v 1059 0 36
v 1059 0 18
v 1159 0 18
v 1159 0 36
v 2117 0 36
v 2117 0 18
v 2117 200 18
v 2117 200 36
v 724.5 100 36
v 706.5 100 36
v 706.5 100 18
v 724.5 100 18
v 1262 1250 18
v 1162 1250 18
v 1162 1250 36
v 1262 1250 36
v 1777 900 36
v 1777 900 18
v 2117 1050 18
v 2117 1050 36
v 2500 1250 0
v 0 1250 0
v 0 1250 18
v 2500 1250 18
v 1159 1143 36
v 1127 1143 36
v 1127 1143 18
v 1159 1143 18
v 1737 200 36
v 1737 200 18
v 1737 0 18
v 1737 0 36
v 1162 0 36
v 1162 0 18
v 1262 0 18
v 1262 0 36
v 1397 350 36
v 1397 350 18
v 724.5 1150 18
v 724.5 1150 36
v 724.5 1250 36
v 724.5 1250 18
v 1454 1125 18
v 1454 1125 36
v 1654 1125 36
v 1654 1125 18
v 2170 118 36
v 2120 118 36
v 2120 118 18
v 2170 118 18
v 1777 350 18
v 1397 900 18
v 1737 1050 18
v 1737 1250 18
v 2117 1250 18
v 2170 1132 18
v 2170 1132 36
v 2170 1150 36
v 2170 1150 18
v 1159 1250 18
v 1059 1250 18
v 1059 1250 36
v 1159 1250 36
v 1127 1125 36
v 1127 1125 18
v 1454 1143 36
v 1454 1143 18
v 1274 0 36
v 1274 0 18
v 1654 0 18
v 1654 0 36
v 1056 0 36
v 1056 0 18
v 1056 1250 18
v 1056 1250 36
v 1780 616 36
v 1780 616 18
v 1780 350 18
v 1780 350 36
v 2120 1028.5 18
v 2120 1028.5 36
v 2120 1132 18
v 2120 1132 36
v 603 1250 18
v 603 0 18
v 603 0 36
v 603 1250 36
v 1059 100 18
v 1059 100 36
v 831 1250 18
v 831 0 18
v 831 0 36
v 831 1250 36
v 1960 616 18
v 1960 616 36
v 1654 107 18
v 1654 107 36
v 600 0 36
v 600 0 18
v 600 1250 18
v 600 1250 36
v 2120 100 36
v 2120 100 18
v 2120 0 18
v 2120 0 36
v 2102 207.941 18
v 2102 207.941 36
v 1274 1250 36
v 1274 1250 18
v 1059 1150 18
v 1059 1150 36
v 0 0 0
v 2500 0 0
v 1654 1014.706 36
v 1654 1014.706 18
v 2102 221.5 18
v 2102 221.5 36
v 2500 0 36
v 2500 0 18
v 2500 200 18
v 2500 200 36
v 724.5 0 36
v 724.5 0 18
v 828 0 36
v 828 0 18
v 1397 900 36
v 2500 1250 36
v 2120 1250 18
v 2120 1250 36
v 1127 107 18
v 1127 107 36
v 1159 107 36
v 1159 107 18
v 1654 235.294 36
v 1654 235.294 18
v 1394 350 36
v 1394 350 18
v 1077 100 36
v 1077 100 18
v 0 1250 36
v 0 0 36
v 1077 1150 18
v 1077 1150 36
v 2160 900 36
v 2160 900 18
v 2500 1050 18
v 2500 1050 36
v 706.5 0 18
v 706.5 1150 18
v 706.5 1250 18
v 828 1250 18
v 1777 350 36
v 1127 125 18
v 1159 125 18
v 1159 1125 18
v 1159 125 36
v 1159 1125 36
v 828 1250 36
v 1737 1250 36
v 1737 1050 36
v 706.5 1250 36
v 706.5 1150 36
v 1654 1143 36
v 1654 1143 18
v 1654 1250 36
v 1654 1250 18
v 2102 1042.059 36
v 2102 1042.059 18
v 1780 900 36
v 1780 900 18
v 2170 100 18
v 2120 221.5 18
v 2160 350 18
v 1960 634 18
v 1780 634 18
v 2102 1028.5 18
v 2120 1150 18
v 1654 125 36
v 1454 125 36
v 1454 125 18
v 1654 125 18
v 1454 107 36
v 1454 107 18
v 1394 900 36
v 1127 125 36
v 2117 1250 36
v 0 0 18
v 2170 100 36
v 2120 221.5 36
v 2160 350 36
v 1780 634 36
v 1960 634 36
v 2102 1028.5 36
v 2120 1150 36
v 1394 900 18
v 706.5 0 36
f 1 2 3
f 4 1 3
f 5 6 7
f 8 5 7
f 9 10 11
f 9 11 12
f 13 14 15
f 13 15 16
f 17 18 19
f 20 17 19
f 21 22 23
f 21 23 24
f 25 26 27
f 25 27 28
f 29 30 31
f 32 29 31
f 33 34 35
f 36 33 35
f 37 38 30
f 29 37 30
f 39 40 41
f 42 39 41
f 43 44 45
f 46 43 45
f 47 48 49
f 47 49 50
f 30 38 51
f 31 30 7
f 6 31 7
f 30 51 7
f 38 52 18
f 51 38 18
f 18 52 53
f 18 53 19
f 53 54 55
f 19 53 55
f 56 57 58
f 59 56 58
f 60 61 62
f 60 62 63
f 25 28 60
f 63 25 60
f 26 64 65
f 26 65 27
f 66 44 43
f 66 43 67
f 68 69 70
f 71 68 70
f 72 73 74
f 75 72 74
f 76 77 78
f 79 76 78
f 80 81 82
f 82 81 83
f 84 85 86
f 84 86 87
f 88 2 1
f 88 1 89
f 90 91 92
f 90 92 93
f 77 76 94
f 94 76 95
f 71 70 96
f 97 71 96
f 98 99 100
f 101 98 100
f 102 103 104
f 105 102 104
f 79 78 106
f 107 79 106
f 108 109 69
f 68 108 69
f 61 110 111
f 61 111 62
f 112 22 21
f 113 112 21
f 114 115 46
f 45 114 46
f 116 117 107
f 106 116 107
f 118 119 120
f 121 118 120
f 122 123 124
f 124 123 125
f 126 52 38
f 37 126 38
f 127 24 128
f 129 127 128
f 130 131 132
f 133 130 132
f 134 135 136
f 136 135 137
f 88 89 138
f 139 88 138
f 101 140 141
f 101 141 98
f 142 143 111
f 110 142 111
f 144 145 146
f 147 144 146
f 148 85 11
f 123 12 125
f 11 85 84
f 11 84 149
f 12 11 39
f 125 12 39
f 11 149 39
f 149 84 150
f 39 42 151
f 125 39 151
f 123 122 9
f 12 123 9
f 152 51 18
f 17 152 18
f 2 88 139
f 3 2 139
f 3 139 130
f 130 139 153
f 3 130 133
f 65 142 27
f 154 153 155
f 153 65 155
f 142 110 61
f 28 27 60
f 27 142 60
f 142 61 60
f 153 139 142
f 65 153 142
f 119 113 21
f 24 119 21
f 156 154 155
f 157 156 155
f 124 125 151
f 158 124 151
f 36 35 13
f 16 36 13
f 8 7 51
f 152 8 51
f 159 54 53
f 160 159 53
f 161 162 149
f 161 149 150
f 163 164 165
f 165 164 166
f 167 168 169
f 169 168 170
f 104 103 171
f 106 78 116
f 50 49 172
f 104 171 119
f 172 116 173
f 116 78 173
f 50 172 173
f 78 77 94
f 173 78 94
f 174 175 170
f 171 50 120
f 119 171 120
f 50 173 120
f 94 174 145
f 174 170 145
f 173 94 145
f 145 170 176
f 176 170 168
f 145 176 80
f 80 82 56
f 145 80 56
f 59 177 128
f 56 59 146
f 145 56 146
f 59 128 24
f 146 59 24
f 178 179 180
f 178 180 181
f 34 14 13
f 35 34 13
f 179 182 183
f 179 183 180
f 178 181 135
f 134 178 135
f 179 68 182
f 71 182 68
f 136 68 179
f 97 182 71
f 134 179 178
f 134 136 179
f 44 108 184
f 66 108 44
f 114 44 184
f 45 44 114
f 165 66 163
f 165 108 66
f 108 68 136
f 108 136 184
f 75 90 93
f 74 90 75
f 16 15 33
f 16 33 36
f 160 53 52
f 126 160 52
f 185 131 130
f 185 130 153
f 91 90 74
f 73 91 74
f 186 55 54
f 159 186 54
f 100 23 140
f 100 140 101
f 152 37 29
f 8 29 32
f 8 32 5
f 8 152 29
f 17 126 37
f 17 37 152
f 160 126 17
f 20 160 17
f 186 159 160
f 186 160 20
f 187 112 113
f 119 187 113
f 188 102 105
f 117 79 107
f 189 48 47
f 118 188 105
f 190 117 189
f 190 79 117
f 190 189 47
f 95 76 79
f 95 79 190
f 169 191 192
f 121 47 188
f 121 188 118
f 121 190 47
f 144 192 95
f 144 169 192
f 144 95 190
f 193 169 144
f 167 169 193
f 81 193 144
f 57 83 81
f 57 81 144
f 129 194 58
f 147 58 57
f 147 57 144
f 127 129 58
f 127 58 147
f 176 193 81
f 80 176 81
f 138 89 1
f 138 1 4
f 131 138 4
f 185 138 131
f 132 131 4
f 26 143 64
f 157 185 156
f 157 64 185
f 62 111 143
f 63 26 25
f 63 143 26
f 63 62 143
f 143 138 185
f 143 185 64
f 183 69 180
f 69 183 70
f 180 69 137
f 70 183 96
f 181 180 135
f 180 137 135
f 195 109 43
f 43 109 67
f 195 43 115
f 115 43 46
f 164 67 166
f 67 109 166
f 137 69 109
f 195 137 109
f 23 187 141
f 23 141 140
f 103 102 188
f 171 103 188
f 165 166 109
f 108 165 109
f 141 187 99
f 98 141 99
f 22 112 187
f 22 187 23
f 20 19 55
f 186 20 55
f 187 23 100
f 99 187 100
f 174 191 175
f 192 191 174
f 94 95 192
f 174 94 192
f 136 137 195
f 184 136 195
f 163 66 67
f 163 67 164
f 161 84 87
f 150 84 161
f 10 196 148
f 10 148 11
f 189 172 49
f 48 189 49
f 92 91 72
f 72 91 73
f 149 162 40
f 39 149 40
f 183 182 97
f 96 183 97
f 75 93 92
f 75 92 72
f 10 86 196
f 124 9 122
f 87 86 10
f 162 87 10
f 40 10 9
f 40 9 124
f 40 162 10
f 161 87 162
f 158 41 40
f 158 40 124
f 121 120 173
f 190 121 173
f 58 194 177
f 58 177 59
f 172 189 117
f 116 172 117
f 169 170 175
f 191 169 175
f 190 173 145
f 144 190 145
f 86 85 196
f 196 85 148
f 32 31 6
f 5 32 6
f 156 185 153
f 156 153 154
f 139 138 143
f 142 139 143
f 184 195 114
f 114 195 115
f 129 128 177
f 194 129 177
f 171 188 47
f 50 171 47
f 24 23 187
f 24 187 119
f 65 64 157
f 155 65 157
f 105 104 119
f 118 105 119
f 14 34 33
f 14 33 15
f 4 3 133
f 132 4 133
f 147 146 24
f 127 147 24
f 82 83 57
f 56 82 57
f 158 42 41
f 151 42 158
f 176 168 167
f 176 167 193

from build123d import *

# Parameters (mm, degrees)
F0_W      = 2500
F0_H      = 1250
F1_DEPTH  = 18
F3_DEPTH  = 18
F6_DEPTH  = 18
F7_W      = 600
F7_H      = 1250
F8_DEPTH  = 18
F9_W      = 225
F9_H      = 1250
F10_DEPTH = 18
F12_W     = 100
F12_H     = 1250
F13_DEPTH = 18
F16_DEPTH = 18
F17_W     = 32
F17_H     = 18
F18_DEPTH = 36.001
F19_W     = 18
F19_H     = 100
F20_DEPTH = 18
F21_W     = 50
F21_H     = 18
F22_DEPTH = 18
F23_W     = 180
F23_H     = 18
F24_DEPTH = 18
F25_W     = 200
F25_H     = 18
F26_DEPTH = 18


with BuildPart() as f1:
    # F0 (on Top) → F1 (new body)
    with BuildSketch(Plane.XY):
        with Locations((1250, 625)):
            Rectangle(F0_W, F0_H)
    extrude(amount=F1_DEPTH)


with BuildPart() as f3:
    # F2 (on face) → F3 (new body)
    with BuildSketch(Plane.XY.offset(18)):
        Polygon((2500, 1050), (2500, 1250), (2120, 1250), (2120, 1050), (1780, 900), (1780, 350), (2120, 200), (2120, 0), (2500, 0), (2500, 200), (2160, 350), (2160, 900), align=None)
    extrude(amount=F3_DEPTH)


with BuildPart() as f4_1:
    # F4: copy of F3
    add(f3.part.moved(Location((-383, 0, 0))))


with BuildPart() as f6:
    # F5 (on face) → F6 (new body)
    with BuildSketch(Plane.XY.offset(18)):
        Polygon((1654, 1014.7058823529), (1654, 1250), (1274, 1250), (1274, 0), (1654, 0), (1654, 235.2941176471), (1394, 350), (1394, 900), align=None)
    extrude(amount=F6_DEPTH)

    # F25 (on face) → F26 (cut, through all)
    with BuildSketch(Plane.XY.offset(36)):
        with Locations((1554, 1134)):
            Rectangle(F25_W, F25_H)
        with Locations((1554, 116)):
            Rectangle(F25_W, F25_H)
    extrude(amount=-F26_DEPTH, mode=Mode.SUBTRACT)


with BuildPart() as f8:
    # F7 (on face) → F8 (new body)
    with BuildSketch(Plane.XY.offset(18)):
        with Locations((300, 625)):
            Rectangle(F7_W, F7_H)
    extrude(amount=F8_DEPTH)


with BuildPart() as f10:
    # F9 (on face) → F10 (new body)
    with BuildSketch(Plane.XY.offset(18)):
        with Locations((715.5, 625)):
            Rectangle(F9_W, F9_H)
    extrude(amount=F10_DEPTH)


with BuildPart() as f11_1:
    # F11: copy of F10
    add(f10.part.moved(Location((228, 0, 0))))


with BuildPart() as f13:
    # F12 (on face) → F13 (new body)
    with BuildSketch(Plane.XY.offset(18)):
        with Locations((1109, 625)):
            Rectangle(F12_W, F12_H)
    extrude(amount=F13_DEPTH)


with BuildPart() as f14_1:
    # F14: copy of F13
    add(f13.part.moved(Location((103, 0, 0))))


with BuildPart() as f13_1:
    add(f13.part)

    # F15 (on face) → F16 (cut)
    with BuildSketch(Plane.XY.offset(36)):
        Polygon((1077, 1150), (1059, 1150), (1059, 100), (1077, 100), (1077, 625), align=None)
    extrude(amount=-F16_DEPTH, mode=Mode.SUBTRACT)

    # F17 (on face) → F18 (cut, through all)
    with BuildSketch(Plane.XY.offset(36)):
        with Locations((1143, 116)):
            Rectangle(F17_W, F17_H)
        with Locations((1143, 1134)):
            Rectangle(F17_W, F17_H)
    extrude(amount=-F18_DEPTH, mode=Mode.SUBTRACT)


with BuildPart() as f10_1:
    add(f10.part)

    # F19 (on face) → F20 (cut)
    with BuildSketch(Plane.XY.offset(36)):
        with Locations((715.5, 1200)):
            Rectangle(F19_W, F19_H)
        with Locations((715.5, 50)):
            Rectangle(F19_W, F19_H)
    extrude(amount=-F20_DEPTH, mode=Mode.SUBTRACT)


with BuildPart() as f3_1:
    add(f3.part)

    # F21 (on face) → F22 (cut, through all)
    with BuildSketch(Plane.XY.offset(36)):
        with Locations((2145, 109)):
            Rectangle(F21_W, F21_H)
        with Locations((2145, 1141)):
            Rectangle(F21_W, F21_H)
        Polygon((2120, 1050), (2102, 1042.0588235294), (2102, 1028.5), (2120, 1028.5), align=None)
        Polygon((2102, 207.9411764706), (2120, 200), (2120, 221.5), (2102, 221.5), align=None)
    extrude(amount=-F22_DEPTH, mode=Mode.SUBTRACT)

    # F23 (on face) → F24 (cut, through all)
    with BuildSketch(Plane.XY.offset(36)):
        with Locations((1870, 625)):
            Rectangle(F23_W, F23_H)
    extrude(amount=-F24_DEPTH, mode=Mode.SUBTRACT)


solid = Compound([f1.part, f4_1.part, f6.part, f8.part, f11_1.part, f14_1.part, f13_1.part, f10_1.part, f3_1.part])
